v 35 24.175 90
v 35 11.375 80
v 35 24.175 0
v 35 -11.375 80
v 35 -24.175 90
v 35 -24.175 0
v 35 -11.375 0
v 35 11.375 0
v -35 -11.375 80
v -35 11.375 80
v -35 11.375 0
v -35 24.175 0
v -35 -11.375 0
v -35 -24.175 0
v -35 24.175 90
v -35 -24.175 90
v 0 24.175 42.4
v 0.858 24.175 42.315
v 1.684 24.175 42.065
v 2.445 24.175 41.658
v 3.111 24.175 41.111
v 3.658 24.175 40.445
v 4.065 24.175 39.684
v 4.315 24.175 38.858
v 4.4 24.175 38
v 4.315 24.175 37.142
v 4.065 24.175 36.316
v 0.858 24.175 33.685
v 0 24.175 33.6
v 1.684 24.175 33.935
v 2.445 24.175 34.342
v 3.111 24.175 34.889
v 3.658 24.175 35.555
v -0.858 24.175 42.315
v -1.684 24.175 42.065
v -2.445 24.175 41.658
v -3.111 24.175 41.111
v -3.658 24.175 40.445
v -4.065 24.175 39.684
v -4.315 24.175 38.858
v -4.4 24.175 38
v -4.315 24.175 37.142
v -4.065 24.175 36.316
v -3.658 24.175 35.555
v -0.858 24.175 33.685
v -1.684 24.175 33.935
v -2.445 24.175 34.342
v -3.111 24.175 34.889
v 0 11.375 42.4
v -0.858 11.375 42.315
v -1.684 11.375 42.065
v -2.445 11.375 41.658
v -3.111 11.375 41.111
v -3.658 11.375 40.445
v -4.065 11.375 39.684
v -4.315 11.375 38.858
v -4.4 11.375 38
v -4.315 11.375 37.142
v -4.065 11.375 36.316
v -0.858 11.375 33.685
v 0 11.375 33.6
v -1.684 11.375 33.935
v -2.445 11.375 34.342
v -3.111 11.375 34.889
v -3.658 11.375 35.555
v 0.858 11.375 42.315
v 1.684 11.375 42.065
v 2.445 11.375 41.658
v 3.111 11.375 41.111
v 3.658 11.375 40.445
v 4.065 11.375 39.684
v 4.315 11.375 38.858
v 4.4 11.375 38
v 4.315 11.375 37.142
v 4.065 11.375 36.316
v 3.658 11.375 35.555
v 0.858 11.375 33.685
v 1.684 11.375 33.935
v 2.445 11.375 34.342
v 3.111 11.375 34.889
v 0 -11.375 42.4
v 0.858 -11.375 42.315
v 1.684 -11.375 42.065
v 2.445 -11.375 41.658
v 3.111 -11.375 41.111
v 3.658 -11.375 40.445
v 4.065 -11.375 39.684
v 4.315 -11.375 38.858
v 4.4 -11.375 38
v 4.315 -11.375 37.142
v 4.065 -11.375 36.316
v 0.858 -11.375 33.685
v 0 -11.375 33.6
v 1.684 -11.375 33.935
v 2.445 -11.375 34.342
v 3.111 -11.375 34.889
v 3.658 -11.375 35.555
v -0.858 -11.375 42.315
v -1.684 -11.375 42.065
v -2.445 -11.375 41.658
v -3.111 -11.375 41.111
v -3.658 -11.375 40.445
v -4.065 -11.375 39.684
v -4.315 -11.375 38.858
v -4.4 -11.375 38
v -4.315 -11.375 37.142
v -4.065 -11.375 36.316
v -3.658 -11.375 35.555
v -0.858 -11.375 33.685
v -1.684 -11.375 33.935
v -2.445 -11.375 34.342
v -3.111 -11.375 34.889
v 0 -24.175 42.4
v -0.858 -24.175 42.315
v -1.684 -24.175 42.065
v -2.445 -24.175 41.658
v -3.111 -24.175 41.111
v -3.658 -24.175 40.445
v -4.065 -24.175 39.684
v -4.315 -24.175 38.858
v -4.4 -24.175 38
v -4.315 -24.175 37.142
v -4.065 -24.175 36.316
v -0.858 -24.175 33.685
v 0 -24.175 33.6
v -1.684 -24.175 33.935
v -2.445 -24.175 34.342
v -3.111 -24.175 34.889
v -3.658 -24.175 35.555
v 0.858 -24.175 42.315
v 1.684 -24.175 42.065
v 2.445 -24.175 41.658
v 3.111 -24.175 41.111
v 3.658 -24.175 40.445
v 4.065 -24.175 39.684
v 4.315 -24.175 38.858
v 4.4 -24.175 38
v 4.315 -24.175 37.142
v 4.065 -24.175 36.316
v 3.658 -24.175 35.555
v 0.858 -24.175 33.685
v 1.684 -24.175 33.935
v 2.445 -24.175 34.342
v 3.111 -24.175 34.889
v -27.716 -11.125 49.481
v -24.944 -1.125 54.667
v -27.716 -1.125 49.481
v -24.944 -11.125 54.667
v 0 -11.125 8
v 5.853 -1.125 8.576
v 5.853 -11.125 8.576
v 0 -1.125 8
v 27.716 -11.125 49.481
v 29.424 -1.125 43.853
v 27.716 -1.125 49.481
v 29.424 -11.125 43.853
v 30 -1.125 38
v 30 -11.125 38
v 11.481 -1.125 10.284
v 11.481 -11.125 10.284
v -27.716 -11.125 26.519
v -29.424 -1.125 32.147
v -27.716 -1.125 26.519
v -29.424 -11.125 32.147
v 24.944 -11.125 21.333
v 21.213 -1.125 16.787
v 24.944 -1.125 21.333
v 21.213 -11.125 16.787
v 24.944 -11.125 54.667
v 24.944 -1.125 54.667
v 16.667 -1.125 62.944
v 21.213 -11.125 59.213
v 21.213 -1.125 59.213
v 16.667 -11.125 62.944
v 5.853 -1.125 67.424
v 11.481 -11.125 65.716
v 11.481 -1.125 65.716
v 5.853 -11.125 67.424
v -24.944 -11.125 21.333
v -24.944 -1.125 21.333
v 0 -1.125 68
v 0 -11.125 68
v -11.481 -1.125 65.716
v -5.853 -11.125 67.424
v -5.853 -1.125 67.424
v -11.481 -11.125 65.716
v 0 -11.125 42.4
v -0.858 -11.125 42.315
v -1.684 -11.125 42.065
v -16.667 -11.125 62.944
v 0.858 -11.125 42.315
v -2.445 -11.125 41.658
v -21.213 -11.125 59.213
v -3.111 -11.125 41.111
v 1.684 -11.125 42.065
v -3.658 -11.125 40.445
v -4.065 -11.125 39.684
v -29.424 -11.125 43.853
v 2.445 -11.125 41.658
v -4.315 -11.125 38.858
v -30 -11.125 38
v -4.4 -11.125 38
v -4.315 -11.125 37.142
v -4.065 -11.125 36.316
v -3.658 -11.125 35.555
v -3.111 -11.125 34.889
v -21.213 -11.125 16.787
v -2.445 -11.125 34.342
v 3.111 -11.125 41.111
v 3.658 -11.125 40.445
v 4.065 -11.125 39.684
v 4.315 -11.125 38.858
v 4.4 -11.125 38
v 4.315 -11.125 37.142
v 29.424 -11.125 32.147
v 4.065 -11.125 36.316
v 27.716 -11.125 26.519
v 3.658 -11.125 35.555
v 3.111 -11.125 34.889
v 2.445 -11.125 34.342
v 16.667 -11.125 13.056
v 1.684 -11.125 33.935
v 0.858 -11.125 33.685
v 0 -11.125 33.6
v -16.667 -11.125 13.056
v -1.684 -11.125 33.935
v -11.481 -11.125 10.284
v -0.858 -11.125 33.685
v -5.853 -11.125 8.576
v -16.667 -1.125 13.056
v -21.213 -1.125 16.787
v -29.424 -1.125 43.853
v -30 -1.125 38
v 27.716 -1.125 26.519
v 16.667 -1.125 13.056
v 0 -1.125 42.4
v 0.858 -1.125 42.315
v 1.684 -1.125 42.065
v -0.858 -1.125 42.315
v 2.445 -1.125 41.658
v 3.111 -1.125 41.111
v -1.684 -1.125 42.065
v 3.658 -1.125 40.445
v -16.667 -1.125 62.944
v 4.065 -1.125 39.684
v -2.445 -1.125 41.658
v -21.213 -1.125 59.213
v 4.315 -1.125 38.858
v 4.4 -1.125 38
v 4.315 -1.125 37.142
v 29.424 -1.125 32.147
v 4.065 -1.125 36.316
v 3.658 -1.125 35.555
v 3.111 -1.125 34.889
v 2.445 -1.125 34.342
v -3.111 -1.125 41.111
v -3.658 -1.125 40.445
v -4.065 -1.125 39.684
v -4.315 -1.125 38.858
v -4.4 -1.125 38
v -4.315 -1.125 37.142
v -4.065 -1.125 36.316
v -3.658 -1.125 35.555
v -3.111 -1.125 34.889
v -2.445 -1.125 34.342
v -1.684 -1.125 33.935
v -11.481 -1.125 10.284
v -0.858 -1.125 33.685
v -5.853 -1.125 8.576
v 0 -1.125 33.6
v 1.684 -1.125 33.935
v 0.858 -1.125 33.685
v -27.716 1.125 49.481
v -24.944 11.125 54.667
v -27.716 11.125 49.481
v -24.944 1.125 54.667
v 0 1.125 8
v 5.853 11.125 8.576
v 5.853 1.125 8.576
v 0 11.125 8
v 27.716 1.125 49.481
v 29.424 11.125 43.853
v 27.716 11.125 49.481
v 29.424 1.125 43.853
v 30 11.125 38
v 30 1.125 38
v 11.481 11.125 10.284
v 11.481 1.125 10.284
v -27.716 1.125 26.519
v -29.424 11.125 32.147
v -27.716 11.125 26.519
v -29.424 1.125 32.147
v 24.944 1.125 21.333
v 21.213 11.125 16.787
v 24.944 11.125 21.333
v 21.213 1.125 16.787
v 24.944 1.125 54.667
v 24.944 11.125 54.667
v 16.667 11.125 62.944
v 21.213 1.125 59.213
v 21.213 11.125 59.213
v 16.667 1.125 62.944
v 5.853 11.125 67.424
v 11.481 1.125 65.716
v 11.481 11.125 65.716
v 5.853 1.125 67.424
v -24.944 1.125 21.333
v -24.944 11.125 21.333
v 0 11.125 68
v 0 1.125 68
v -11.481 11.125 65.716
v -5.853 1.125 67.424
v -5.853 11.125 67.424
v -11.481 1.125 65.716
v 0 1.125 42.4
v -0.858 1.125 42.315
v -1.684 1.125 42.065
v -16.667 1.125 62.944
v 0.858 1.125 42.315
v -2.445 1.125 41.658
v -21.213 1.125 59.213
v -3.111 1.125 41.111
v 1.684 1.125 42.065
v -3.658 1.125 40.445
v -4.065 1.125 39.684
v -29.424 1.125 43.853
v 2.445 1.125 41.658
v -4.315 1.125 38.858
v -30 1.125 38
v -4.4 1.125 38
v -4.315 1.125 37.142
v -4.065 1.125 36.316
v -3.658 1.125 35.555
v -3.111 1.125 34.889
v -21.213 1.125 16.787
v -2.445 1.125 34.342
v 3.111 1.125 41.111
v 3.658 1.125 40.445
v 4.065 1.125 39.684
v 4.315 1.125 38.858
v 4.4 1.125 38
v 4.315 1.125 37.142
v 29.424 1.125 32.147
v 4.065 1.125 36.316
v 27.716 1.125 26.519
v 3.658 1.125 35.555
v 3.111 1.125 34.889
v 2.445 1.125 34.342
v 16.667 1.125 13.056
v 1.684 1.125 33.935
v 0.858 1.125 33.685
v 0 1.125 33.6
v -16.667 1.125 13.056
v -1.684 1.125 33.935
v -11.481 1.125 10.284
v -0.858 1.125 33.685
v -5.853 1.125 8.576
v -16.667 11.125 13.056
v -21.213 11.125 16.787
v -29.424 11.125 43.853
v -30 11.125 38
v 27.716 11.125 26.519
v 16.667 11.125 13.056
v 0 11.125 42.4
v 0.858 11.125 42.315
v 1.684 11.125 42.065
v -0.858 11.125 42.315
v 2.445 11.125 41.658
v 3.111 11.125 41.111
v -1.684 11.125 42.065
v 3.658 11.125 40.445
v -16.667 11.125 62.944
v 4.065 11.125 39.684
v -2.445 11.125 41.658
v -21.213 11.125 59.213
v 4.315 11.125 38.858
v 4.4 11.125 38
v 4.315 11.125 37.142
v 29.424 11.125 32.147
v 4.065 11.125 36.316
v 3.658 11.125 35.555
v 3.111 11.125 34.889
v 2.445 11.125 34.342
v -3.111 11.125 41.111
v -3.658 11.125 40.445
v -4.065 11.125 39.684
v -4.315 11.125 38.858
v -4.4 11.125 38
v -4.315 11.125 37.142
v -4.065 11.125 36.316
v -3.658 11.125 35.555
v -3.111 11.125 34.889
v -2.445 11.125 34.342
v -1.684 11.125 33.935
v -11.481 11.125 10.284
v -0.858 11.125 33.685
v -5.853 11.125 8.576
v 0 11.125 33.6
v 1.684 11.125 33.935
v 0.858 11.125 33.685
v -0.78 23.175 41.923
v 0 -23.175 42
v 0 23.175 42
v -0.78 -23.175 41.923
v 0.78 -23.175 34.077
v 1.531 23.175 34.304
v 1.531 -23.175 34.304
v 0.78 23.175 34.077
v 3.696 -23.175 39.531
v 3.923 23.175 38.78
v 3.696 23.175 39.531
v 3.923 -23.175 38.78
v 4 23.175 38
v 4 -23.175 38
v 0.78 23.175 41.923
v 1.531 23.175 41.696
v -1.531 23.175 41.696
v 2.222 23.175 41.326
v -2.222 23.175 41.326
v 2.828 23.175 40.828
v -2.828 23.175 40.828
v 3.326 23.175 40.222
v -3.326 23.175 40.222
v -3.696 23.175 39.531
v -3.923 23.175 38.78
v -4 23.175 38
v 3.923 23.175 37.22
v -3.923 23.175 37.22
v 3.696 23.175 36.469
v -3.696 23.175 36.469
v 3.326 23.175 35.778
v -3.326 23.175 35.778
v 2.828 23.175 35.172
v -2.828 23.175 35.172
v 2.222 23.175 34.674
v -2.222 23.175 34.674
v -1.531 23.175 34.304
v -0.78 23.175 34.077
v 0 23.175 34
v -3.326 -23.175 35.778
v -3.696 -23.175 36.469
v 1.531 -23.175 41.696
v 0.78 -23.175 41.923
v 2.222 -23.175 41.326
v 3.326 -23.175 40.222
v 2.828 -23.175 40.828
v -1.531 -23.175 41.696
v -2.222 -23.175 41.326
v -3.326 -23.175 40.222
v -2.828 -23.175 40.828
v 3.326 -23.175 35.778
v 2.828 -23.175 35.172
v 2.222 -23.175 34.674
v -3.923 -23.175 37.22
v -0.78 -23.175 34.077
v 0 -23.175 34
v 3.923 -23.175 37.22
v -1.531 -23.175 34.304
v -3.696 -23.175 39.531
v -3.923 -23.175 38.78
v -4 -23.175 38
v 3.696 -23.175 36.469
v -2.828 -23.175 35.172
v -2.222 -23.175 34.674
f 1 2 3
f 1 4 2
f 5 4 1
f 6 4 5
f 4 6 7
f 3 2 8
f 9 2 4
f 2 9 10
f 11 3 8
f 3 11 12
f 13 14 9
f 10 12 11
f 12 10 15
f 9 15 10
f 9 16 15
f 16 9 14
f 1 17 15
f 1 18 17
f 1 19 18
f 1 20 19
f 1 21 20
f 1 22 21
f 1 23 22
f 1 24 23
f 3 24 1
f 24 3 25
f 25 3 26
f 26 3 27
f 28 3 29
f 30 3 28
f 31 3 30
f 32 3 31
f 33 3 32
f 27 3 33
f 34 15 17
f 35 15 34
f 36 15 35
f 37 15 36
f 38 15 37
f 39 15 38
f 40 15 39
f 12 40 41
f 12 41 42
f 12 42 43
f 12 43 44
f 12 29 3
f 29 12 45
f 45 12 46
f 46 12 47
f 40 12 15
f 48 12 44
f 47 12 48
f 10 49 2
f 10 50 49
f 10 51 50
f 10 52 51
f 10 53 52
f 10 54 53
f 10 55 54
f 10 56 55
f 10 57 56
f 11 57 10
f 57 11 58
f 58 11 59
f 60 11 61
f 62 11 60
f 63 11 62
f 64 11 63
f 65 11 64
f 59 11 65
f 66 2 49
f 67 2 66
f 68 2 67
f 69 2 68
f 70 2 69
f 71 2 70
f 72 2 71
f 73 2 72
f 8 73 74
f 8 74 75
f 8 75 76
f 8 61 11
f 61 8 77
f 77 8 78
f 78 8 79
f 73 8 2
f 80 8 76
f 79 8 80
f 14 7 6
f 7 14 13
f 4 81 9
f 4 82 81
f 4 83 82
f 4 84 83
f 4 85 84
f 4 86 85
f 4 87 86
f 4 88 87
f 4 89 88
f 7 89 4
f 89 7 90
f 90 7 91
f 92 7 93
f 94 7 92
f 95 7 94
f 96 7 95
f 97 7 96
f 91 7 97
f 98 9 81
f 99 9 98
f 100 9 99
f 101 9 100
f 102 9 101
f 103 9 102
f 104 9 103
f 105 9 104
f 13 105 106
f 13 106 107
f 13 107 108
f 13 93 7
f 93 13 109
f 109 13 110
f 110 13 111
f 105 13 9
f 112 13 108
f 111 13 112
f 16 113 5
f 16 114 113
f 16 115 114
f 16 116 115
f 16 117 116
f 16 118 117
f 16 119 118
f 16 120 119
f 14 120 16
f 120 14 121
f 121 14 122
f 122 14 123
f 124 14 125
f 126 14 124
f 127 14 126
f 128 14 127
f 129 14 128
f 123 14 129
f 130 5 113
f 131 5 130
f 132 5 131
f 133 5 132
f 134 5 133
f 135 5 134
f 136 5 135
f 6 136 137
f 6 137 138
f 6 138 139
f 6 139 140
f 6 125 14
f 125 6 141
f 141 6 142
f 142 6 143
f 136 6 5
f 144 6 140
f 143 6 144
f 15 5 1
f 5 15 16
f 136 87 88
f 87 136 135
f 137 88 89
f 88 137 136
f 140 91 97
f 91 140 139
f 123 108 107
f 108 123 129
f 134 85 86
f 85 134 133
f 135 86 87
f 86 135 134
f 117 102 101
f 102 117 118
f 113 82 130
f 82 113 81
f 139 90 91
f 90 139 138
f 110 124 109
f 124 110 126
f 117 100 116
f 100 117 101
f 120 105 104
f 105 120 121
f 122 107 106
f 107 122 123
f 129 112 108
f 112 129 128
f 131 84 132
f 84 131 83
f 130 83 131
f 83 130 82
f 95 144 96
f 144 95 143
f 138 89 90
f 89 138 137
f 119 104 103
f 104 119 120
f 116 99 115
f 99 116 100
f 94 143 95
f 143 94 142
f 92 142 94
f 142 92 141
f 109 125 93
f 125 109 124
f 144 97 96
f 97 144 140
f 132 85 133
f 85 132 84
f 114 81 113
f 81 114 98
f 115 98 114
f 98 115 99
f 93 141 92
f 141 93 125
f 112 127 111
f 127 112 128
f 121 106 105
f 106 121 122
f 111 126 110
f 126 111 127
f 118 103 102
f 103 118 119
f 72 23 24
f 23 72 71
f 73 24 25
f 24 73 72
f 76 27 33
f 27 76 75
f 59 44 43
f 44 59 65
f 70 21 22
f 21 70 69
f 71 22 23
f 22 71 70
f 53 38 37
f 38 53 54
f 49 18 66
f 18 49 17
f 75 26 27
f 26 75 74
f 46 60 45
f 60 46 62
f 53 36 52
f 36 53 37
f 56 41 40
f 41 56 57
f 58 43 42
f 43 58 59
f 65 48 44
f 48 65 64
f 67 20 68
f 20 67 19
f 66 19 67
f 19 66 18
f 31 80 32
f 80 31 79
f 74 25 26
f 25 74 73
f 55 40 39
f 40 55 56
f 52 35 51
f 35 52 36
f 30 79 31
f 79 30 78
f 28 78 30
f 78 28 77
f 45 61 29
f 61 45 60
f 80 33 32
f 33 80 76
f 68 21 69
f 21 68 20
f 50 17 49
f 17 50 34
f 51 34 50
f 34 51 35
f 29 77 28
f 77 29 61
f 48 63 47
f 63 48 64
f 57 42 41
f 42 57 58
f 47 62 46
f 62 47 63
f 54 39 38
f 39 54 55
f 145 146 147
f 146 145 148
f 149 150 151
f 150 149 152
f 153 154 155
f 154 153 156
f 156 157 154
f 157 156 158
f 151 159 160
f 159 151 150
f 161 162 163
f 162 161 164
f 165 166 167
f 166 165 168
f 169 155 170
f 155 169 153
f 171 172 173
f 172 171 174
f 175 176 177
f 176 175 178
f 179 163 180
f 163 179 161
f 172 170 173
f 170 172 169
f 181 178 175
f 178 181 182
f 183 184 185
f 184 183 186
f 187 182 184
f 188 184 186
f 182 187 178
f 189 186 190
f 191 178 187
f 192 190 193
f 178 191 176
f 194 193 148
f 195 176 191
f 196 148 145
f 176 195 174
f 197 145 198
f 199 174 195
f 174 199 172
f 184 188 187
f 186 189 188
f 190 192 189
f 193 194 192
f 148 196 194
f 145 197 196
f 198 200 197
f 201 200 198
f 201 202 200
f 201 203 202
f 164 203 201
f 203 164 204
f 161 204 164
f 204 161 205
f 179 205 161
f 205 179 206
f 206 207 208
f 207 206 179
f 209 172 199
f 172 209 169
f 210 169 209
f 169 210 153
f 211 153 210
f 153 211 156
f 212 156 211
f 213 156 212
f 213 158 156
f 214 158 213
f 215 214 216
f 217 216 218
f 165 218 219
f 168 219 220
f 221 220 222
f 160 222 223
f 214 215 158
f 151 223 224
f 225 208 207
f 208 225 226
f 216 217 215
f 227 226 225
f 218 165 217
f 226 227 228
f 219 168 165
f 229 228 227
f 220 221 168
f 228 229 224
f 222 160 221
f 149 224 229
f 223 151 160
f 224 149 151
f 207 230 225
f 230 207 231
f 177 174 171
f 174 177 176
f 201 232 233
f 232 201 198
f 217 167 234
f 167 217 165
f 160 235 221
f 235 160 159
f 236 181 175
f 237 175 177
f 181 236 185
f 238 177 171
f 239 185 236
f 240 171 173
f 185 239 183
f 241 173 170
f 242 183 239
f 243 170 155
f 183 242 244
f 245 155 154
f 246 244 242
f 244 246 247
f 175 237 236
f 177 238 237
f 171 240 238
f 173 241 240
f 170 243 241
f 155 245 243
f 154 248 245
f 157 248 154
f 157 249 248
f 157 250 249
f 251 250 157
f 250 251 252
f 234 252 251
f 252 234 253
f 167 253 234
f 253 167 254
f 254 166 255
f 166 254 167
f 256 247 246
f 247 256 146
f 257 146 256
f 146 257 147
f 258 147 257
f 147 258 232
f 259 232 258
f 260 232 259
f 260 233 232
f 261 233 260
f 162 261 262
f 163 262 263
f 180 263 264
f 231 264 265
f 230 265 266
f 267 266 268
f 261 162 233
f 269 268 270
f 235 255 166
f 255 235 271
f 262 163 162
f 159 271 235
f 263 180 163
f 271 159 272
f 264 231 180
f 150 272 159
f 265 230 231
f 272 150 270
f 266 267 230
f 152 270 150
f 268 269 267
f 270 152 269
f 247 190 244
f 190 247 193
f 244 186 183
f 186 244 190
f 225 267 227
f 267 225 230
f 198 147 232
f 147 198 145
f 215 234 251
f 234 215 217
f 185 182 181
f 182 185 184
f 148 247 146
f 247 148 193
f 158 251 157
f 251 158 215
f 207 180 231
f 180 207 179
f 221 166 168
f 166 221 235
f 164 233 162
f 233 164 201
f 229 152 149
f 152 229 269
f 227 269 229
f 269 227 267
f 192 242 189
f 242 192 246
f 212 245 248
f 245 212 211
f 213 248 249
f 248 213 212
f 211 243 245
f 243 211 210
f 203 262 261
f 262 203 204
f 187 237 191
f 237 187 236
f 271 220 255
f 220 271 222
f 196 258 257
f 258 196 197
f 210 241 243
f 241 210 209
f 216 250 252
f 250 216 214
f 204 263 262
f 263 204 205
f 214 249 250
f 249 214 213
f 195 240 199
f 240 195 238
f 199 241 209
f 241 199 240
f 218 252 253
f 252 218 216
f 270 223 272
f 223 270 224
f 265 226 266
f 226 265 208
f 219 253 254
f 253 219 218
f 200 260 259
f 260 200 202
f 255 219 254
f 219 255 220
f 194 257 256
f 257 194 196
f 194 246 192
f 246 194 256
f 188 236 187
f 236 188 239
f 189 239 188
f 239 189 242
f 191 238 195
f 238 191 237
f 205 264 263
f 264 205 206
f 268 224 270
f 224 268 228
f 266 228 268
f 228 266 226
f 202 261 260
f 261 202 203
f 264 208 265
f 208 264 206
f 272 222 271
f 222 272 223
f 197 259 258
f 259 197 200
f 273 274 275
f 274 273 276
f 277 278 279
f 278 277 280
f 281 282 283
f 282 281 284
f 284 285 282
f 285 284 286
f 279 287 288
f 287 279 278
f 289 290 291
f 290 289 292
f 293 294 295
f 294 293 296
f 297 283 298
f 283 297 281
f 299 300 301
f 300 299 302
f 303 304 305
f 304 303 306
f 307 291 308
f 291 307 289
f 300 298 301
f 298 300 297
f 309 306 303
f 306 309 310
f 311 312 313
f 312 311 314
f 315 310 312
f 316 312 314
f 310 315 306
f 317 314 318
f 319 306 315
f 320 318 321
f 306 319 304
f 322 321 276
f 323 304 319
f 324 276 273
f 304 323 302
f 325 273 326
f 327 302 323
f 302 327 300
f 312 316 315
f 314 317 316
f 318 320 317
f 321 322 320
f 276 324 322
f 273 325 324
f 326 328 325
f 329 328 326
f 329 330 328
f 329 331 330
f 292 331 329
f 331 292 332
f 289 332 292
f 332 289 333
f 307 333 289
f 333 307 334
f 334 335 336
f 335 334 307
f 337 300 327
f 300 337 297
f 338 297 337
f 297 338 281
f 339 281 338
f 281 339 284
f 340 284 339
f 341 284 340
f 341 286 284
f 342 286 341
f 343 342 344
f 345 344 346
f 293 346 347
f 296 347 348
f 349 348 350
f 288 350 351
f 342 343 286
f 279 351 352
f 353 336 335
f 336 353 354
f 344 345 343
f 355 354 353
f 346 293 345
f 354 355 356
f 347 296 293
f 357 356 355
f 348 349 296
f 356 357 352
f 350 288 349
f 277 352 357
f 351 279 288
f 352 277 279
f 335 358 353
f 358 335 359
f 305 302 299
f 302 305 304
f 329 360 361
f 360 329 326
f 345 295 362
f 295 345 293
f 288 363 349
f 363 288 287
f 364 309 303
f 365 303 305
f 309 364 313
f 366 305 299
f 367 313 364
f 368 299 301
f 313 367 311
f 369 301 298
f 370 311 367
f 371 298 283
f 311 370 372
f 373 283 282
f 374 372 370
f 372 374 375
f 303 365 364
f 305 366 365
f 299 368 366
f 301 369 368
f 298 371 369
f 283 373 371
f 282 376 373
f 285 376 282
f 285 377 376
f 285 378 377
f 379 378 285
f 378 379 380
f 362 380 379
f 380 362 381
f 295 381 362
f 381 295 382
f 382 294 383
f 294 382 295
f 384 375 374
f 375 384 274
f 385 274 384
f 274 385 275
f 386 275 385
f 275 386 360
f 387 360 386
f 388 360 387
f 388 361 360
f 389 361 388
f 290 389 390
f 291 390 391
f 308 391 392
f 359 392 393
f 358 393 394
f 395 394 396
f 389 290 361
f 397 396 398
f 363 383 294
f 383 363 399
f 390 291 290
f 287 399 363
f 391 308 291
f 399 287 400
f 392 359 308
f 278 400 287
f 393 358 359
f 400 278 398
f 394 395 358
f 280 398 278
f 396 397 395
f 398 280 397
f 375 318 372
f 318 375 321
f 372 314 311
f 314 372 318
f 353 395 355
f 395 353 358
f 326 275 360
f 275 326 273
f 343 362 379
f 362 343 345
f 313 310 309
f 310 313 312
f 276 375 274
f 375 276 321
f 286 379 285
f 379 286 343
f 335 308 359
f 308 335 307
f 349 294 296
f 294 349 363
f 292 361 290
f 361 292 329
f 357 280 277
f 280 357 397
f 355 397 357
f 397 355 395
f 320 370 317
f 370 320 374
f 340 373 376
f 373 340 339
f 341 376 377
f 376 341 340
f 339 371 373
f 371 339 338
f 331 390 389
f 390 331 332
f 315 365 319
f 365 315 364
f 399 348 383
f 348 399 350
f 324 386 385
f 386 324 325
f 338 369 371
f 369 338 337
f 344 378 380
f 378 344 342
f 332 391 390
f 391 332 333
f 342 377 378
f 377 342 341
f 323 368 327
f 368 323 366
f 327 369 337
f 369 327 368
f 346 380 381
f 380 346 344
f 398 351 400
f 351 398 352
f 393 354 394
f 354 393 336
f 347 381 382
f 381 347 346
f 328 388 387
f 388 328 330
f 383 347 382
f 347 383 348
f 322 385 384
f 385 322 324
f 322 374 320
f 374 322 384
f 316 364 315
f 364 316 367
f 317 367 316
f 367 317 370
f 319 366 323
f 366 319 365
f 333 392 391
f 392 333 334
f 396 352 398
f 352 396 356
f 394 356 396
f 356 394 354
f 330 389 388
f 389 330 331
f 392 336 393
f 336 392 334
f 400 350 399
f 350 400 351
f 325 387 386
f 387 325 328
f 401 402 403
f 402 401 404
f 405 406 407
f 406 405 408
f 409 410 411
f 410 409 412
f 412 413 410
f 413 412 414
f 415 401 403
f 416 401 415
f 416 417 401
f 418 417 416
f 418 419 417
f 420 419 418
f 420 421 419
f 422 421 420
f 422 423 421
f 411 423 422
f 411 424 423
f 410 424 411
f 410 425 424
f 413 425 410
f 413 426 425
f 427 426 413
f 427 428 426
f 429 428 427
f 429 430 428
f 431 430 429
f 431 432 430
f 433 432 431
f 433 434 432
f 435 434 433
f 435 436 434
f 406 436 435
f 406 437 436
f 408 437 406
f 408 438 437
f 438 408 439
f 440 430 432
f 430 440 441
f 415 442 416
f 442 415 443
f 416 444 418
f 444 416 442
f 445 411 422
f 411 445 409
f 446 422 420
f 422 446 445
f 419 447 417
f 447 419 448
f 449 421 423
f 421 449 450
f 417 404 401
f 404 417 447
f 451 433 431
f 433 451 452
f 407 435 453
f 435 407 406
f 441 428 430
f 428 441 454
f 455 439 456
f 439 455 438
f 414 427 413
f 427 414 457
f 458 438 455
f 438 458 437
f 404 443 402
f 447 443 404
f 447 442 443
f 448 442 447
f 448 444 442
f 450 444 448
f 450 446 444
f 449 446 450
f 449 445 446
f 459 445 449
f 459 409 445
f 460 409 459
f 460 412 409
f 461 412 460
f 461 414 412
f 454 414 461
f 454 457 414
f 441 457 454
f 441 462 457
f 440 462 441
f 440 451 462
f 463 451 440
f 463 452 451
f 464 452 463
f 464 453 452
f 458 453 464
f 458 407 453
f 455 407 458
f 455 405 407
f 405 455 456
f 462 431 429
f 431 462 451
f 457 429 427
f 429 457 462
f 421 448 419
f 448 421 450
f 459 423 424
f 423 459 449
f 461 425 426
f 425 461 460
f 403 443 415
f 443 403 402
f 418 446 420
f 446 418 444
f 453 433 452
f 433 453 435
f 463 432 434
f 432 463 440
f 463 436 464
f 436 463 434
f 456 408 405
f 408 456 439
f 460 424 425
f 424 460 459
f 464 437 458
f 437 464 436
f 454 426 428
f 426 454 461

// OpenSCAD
$fn = 32;

// ------------------------------------------------------------------------
// Trolley wheel set: wheels d60, fork 80 mm tall
// Every part is its own module, assembly() places every instance.
// ------------------------------------------------------------------------

// --- part 1 ---
module trolley_fork() {
  difference() {
    union() {
      translate([-35, 11.375, 0]) cube([70, 12.8, 80]);
      translate([-35, -24.175, 0]) cube([70, 12.8, 80]);
      translate([-35, -24.175, 80]) cube([70, 48.35, 10]);
    }
    translate([0, -17.775, 38]) rotate([90, 0, 0]) cylinder(h = 14.8, d = 8.8, center = true);
    translate([0, 17.775, 38]) rotate([90, 0, 0]) cylinder(h = 14.8, d = 8.8, center = true);
  }
}

// --- part 2 ---
module trolley_wheel() {
  difference() {
      translate([0, 0, 0]) cylinder(h = 10, d = 60);
      translate([0, 0, -1]) cylinder(h = 12, d = 8.8);
    }
}

// --- part 3 ---
module trolley_axle() {
  translate([0, 0, -23.175]) cylinder(h = 46.35, d = 8);
}

// --- assembly ---
module assembly() {
  color([0.80, 0.24, 0.20]) translate([0, 0, 0]) rotate([0, 0, 0]) trolley_fork();
  color([0.20, 0.45, 0.75]) translate([0, -1.125, 38]) rotate([90, 0, 0]) trolley_wheel();
  color([0.25, 0.62, 0.32]) translate([0, 11.125, 38]) rotate([90, 0, 0]) trolley_wheel();
  color([0.92, 0.70, 0.18]) translate([0, 0, 38]) rotate([90, 0, 0]) trolley_axle();
}

assembly();
